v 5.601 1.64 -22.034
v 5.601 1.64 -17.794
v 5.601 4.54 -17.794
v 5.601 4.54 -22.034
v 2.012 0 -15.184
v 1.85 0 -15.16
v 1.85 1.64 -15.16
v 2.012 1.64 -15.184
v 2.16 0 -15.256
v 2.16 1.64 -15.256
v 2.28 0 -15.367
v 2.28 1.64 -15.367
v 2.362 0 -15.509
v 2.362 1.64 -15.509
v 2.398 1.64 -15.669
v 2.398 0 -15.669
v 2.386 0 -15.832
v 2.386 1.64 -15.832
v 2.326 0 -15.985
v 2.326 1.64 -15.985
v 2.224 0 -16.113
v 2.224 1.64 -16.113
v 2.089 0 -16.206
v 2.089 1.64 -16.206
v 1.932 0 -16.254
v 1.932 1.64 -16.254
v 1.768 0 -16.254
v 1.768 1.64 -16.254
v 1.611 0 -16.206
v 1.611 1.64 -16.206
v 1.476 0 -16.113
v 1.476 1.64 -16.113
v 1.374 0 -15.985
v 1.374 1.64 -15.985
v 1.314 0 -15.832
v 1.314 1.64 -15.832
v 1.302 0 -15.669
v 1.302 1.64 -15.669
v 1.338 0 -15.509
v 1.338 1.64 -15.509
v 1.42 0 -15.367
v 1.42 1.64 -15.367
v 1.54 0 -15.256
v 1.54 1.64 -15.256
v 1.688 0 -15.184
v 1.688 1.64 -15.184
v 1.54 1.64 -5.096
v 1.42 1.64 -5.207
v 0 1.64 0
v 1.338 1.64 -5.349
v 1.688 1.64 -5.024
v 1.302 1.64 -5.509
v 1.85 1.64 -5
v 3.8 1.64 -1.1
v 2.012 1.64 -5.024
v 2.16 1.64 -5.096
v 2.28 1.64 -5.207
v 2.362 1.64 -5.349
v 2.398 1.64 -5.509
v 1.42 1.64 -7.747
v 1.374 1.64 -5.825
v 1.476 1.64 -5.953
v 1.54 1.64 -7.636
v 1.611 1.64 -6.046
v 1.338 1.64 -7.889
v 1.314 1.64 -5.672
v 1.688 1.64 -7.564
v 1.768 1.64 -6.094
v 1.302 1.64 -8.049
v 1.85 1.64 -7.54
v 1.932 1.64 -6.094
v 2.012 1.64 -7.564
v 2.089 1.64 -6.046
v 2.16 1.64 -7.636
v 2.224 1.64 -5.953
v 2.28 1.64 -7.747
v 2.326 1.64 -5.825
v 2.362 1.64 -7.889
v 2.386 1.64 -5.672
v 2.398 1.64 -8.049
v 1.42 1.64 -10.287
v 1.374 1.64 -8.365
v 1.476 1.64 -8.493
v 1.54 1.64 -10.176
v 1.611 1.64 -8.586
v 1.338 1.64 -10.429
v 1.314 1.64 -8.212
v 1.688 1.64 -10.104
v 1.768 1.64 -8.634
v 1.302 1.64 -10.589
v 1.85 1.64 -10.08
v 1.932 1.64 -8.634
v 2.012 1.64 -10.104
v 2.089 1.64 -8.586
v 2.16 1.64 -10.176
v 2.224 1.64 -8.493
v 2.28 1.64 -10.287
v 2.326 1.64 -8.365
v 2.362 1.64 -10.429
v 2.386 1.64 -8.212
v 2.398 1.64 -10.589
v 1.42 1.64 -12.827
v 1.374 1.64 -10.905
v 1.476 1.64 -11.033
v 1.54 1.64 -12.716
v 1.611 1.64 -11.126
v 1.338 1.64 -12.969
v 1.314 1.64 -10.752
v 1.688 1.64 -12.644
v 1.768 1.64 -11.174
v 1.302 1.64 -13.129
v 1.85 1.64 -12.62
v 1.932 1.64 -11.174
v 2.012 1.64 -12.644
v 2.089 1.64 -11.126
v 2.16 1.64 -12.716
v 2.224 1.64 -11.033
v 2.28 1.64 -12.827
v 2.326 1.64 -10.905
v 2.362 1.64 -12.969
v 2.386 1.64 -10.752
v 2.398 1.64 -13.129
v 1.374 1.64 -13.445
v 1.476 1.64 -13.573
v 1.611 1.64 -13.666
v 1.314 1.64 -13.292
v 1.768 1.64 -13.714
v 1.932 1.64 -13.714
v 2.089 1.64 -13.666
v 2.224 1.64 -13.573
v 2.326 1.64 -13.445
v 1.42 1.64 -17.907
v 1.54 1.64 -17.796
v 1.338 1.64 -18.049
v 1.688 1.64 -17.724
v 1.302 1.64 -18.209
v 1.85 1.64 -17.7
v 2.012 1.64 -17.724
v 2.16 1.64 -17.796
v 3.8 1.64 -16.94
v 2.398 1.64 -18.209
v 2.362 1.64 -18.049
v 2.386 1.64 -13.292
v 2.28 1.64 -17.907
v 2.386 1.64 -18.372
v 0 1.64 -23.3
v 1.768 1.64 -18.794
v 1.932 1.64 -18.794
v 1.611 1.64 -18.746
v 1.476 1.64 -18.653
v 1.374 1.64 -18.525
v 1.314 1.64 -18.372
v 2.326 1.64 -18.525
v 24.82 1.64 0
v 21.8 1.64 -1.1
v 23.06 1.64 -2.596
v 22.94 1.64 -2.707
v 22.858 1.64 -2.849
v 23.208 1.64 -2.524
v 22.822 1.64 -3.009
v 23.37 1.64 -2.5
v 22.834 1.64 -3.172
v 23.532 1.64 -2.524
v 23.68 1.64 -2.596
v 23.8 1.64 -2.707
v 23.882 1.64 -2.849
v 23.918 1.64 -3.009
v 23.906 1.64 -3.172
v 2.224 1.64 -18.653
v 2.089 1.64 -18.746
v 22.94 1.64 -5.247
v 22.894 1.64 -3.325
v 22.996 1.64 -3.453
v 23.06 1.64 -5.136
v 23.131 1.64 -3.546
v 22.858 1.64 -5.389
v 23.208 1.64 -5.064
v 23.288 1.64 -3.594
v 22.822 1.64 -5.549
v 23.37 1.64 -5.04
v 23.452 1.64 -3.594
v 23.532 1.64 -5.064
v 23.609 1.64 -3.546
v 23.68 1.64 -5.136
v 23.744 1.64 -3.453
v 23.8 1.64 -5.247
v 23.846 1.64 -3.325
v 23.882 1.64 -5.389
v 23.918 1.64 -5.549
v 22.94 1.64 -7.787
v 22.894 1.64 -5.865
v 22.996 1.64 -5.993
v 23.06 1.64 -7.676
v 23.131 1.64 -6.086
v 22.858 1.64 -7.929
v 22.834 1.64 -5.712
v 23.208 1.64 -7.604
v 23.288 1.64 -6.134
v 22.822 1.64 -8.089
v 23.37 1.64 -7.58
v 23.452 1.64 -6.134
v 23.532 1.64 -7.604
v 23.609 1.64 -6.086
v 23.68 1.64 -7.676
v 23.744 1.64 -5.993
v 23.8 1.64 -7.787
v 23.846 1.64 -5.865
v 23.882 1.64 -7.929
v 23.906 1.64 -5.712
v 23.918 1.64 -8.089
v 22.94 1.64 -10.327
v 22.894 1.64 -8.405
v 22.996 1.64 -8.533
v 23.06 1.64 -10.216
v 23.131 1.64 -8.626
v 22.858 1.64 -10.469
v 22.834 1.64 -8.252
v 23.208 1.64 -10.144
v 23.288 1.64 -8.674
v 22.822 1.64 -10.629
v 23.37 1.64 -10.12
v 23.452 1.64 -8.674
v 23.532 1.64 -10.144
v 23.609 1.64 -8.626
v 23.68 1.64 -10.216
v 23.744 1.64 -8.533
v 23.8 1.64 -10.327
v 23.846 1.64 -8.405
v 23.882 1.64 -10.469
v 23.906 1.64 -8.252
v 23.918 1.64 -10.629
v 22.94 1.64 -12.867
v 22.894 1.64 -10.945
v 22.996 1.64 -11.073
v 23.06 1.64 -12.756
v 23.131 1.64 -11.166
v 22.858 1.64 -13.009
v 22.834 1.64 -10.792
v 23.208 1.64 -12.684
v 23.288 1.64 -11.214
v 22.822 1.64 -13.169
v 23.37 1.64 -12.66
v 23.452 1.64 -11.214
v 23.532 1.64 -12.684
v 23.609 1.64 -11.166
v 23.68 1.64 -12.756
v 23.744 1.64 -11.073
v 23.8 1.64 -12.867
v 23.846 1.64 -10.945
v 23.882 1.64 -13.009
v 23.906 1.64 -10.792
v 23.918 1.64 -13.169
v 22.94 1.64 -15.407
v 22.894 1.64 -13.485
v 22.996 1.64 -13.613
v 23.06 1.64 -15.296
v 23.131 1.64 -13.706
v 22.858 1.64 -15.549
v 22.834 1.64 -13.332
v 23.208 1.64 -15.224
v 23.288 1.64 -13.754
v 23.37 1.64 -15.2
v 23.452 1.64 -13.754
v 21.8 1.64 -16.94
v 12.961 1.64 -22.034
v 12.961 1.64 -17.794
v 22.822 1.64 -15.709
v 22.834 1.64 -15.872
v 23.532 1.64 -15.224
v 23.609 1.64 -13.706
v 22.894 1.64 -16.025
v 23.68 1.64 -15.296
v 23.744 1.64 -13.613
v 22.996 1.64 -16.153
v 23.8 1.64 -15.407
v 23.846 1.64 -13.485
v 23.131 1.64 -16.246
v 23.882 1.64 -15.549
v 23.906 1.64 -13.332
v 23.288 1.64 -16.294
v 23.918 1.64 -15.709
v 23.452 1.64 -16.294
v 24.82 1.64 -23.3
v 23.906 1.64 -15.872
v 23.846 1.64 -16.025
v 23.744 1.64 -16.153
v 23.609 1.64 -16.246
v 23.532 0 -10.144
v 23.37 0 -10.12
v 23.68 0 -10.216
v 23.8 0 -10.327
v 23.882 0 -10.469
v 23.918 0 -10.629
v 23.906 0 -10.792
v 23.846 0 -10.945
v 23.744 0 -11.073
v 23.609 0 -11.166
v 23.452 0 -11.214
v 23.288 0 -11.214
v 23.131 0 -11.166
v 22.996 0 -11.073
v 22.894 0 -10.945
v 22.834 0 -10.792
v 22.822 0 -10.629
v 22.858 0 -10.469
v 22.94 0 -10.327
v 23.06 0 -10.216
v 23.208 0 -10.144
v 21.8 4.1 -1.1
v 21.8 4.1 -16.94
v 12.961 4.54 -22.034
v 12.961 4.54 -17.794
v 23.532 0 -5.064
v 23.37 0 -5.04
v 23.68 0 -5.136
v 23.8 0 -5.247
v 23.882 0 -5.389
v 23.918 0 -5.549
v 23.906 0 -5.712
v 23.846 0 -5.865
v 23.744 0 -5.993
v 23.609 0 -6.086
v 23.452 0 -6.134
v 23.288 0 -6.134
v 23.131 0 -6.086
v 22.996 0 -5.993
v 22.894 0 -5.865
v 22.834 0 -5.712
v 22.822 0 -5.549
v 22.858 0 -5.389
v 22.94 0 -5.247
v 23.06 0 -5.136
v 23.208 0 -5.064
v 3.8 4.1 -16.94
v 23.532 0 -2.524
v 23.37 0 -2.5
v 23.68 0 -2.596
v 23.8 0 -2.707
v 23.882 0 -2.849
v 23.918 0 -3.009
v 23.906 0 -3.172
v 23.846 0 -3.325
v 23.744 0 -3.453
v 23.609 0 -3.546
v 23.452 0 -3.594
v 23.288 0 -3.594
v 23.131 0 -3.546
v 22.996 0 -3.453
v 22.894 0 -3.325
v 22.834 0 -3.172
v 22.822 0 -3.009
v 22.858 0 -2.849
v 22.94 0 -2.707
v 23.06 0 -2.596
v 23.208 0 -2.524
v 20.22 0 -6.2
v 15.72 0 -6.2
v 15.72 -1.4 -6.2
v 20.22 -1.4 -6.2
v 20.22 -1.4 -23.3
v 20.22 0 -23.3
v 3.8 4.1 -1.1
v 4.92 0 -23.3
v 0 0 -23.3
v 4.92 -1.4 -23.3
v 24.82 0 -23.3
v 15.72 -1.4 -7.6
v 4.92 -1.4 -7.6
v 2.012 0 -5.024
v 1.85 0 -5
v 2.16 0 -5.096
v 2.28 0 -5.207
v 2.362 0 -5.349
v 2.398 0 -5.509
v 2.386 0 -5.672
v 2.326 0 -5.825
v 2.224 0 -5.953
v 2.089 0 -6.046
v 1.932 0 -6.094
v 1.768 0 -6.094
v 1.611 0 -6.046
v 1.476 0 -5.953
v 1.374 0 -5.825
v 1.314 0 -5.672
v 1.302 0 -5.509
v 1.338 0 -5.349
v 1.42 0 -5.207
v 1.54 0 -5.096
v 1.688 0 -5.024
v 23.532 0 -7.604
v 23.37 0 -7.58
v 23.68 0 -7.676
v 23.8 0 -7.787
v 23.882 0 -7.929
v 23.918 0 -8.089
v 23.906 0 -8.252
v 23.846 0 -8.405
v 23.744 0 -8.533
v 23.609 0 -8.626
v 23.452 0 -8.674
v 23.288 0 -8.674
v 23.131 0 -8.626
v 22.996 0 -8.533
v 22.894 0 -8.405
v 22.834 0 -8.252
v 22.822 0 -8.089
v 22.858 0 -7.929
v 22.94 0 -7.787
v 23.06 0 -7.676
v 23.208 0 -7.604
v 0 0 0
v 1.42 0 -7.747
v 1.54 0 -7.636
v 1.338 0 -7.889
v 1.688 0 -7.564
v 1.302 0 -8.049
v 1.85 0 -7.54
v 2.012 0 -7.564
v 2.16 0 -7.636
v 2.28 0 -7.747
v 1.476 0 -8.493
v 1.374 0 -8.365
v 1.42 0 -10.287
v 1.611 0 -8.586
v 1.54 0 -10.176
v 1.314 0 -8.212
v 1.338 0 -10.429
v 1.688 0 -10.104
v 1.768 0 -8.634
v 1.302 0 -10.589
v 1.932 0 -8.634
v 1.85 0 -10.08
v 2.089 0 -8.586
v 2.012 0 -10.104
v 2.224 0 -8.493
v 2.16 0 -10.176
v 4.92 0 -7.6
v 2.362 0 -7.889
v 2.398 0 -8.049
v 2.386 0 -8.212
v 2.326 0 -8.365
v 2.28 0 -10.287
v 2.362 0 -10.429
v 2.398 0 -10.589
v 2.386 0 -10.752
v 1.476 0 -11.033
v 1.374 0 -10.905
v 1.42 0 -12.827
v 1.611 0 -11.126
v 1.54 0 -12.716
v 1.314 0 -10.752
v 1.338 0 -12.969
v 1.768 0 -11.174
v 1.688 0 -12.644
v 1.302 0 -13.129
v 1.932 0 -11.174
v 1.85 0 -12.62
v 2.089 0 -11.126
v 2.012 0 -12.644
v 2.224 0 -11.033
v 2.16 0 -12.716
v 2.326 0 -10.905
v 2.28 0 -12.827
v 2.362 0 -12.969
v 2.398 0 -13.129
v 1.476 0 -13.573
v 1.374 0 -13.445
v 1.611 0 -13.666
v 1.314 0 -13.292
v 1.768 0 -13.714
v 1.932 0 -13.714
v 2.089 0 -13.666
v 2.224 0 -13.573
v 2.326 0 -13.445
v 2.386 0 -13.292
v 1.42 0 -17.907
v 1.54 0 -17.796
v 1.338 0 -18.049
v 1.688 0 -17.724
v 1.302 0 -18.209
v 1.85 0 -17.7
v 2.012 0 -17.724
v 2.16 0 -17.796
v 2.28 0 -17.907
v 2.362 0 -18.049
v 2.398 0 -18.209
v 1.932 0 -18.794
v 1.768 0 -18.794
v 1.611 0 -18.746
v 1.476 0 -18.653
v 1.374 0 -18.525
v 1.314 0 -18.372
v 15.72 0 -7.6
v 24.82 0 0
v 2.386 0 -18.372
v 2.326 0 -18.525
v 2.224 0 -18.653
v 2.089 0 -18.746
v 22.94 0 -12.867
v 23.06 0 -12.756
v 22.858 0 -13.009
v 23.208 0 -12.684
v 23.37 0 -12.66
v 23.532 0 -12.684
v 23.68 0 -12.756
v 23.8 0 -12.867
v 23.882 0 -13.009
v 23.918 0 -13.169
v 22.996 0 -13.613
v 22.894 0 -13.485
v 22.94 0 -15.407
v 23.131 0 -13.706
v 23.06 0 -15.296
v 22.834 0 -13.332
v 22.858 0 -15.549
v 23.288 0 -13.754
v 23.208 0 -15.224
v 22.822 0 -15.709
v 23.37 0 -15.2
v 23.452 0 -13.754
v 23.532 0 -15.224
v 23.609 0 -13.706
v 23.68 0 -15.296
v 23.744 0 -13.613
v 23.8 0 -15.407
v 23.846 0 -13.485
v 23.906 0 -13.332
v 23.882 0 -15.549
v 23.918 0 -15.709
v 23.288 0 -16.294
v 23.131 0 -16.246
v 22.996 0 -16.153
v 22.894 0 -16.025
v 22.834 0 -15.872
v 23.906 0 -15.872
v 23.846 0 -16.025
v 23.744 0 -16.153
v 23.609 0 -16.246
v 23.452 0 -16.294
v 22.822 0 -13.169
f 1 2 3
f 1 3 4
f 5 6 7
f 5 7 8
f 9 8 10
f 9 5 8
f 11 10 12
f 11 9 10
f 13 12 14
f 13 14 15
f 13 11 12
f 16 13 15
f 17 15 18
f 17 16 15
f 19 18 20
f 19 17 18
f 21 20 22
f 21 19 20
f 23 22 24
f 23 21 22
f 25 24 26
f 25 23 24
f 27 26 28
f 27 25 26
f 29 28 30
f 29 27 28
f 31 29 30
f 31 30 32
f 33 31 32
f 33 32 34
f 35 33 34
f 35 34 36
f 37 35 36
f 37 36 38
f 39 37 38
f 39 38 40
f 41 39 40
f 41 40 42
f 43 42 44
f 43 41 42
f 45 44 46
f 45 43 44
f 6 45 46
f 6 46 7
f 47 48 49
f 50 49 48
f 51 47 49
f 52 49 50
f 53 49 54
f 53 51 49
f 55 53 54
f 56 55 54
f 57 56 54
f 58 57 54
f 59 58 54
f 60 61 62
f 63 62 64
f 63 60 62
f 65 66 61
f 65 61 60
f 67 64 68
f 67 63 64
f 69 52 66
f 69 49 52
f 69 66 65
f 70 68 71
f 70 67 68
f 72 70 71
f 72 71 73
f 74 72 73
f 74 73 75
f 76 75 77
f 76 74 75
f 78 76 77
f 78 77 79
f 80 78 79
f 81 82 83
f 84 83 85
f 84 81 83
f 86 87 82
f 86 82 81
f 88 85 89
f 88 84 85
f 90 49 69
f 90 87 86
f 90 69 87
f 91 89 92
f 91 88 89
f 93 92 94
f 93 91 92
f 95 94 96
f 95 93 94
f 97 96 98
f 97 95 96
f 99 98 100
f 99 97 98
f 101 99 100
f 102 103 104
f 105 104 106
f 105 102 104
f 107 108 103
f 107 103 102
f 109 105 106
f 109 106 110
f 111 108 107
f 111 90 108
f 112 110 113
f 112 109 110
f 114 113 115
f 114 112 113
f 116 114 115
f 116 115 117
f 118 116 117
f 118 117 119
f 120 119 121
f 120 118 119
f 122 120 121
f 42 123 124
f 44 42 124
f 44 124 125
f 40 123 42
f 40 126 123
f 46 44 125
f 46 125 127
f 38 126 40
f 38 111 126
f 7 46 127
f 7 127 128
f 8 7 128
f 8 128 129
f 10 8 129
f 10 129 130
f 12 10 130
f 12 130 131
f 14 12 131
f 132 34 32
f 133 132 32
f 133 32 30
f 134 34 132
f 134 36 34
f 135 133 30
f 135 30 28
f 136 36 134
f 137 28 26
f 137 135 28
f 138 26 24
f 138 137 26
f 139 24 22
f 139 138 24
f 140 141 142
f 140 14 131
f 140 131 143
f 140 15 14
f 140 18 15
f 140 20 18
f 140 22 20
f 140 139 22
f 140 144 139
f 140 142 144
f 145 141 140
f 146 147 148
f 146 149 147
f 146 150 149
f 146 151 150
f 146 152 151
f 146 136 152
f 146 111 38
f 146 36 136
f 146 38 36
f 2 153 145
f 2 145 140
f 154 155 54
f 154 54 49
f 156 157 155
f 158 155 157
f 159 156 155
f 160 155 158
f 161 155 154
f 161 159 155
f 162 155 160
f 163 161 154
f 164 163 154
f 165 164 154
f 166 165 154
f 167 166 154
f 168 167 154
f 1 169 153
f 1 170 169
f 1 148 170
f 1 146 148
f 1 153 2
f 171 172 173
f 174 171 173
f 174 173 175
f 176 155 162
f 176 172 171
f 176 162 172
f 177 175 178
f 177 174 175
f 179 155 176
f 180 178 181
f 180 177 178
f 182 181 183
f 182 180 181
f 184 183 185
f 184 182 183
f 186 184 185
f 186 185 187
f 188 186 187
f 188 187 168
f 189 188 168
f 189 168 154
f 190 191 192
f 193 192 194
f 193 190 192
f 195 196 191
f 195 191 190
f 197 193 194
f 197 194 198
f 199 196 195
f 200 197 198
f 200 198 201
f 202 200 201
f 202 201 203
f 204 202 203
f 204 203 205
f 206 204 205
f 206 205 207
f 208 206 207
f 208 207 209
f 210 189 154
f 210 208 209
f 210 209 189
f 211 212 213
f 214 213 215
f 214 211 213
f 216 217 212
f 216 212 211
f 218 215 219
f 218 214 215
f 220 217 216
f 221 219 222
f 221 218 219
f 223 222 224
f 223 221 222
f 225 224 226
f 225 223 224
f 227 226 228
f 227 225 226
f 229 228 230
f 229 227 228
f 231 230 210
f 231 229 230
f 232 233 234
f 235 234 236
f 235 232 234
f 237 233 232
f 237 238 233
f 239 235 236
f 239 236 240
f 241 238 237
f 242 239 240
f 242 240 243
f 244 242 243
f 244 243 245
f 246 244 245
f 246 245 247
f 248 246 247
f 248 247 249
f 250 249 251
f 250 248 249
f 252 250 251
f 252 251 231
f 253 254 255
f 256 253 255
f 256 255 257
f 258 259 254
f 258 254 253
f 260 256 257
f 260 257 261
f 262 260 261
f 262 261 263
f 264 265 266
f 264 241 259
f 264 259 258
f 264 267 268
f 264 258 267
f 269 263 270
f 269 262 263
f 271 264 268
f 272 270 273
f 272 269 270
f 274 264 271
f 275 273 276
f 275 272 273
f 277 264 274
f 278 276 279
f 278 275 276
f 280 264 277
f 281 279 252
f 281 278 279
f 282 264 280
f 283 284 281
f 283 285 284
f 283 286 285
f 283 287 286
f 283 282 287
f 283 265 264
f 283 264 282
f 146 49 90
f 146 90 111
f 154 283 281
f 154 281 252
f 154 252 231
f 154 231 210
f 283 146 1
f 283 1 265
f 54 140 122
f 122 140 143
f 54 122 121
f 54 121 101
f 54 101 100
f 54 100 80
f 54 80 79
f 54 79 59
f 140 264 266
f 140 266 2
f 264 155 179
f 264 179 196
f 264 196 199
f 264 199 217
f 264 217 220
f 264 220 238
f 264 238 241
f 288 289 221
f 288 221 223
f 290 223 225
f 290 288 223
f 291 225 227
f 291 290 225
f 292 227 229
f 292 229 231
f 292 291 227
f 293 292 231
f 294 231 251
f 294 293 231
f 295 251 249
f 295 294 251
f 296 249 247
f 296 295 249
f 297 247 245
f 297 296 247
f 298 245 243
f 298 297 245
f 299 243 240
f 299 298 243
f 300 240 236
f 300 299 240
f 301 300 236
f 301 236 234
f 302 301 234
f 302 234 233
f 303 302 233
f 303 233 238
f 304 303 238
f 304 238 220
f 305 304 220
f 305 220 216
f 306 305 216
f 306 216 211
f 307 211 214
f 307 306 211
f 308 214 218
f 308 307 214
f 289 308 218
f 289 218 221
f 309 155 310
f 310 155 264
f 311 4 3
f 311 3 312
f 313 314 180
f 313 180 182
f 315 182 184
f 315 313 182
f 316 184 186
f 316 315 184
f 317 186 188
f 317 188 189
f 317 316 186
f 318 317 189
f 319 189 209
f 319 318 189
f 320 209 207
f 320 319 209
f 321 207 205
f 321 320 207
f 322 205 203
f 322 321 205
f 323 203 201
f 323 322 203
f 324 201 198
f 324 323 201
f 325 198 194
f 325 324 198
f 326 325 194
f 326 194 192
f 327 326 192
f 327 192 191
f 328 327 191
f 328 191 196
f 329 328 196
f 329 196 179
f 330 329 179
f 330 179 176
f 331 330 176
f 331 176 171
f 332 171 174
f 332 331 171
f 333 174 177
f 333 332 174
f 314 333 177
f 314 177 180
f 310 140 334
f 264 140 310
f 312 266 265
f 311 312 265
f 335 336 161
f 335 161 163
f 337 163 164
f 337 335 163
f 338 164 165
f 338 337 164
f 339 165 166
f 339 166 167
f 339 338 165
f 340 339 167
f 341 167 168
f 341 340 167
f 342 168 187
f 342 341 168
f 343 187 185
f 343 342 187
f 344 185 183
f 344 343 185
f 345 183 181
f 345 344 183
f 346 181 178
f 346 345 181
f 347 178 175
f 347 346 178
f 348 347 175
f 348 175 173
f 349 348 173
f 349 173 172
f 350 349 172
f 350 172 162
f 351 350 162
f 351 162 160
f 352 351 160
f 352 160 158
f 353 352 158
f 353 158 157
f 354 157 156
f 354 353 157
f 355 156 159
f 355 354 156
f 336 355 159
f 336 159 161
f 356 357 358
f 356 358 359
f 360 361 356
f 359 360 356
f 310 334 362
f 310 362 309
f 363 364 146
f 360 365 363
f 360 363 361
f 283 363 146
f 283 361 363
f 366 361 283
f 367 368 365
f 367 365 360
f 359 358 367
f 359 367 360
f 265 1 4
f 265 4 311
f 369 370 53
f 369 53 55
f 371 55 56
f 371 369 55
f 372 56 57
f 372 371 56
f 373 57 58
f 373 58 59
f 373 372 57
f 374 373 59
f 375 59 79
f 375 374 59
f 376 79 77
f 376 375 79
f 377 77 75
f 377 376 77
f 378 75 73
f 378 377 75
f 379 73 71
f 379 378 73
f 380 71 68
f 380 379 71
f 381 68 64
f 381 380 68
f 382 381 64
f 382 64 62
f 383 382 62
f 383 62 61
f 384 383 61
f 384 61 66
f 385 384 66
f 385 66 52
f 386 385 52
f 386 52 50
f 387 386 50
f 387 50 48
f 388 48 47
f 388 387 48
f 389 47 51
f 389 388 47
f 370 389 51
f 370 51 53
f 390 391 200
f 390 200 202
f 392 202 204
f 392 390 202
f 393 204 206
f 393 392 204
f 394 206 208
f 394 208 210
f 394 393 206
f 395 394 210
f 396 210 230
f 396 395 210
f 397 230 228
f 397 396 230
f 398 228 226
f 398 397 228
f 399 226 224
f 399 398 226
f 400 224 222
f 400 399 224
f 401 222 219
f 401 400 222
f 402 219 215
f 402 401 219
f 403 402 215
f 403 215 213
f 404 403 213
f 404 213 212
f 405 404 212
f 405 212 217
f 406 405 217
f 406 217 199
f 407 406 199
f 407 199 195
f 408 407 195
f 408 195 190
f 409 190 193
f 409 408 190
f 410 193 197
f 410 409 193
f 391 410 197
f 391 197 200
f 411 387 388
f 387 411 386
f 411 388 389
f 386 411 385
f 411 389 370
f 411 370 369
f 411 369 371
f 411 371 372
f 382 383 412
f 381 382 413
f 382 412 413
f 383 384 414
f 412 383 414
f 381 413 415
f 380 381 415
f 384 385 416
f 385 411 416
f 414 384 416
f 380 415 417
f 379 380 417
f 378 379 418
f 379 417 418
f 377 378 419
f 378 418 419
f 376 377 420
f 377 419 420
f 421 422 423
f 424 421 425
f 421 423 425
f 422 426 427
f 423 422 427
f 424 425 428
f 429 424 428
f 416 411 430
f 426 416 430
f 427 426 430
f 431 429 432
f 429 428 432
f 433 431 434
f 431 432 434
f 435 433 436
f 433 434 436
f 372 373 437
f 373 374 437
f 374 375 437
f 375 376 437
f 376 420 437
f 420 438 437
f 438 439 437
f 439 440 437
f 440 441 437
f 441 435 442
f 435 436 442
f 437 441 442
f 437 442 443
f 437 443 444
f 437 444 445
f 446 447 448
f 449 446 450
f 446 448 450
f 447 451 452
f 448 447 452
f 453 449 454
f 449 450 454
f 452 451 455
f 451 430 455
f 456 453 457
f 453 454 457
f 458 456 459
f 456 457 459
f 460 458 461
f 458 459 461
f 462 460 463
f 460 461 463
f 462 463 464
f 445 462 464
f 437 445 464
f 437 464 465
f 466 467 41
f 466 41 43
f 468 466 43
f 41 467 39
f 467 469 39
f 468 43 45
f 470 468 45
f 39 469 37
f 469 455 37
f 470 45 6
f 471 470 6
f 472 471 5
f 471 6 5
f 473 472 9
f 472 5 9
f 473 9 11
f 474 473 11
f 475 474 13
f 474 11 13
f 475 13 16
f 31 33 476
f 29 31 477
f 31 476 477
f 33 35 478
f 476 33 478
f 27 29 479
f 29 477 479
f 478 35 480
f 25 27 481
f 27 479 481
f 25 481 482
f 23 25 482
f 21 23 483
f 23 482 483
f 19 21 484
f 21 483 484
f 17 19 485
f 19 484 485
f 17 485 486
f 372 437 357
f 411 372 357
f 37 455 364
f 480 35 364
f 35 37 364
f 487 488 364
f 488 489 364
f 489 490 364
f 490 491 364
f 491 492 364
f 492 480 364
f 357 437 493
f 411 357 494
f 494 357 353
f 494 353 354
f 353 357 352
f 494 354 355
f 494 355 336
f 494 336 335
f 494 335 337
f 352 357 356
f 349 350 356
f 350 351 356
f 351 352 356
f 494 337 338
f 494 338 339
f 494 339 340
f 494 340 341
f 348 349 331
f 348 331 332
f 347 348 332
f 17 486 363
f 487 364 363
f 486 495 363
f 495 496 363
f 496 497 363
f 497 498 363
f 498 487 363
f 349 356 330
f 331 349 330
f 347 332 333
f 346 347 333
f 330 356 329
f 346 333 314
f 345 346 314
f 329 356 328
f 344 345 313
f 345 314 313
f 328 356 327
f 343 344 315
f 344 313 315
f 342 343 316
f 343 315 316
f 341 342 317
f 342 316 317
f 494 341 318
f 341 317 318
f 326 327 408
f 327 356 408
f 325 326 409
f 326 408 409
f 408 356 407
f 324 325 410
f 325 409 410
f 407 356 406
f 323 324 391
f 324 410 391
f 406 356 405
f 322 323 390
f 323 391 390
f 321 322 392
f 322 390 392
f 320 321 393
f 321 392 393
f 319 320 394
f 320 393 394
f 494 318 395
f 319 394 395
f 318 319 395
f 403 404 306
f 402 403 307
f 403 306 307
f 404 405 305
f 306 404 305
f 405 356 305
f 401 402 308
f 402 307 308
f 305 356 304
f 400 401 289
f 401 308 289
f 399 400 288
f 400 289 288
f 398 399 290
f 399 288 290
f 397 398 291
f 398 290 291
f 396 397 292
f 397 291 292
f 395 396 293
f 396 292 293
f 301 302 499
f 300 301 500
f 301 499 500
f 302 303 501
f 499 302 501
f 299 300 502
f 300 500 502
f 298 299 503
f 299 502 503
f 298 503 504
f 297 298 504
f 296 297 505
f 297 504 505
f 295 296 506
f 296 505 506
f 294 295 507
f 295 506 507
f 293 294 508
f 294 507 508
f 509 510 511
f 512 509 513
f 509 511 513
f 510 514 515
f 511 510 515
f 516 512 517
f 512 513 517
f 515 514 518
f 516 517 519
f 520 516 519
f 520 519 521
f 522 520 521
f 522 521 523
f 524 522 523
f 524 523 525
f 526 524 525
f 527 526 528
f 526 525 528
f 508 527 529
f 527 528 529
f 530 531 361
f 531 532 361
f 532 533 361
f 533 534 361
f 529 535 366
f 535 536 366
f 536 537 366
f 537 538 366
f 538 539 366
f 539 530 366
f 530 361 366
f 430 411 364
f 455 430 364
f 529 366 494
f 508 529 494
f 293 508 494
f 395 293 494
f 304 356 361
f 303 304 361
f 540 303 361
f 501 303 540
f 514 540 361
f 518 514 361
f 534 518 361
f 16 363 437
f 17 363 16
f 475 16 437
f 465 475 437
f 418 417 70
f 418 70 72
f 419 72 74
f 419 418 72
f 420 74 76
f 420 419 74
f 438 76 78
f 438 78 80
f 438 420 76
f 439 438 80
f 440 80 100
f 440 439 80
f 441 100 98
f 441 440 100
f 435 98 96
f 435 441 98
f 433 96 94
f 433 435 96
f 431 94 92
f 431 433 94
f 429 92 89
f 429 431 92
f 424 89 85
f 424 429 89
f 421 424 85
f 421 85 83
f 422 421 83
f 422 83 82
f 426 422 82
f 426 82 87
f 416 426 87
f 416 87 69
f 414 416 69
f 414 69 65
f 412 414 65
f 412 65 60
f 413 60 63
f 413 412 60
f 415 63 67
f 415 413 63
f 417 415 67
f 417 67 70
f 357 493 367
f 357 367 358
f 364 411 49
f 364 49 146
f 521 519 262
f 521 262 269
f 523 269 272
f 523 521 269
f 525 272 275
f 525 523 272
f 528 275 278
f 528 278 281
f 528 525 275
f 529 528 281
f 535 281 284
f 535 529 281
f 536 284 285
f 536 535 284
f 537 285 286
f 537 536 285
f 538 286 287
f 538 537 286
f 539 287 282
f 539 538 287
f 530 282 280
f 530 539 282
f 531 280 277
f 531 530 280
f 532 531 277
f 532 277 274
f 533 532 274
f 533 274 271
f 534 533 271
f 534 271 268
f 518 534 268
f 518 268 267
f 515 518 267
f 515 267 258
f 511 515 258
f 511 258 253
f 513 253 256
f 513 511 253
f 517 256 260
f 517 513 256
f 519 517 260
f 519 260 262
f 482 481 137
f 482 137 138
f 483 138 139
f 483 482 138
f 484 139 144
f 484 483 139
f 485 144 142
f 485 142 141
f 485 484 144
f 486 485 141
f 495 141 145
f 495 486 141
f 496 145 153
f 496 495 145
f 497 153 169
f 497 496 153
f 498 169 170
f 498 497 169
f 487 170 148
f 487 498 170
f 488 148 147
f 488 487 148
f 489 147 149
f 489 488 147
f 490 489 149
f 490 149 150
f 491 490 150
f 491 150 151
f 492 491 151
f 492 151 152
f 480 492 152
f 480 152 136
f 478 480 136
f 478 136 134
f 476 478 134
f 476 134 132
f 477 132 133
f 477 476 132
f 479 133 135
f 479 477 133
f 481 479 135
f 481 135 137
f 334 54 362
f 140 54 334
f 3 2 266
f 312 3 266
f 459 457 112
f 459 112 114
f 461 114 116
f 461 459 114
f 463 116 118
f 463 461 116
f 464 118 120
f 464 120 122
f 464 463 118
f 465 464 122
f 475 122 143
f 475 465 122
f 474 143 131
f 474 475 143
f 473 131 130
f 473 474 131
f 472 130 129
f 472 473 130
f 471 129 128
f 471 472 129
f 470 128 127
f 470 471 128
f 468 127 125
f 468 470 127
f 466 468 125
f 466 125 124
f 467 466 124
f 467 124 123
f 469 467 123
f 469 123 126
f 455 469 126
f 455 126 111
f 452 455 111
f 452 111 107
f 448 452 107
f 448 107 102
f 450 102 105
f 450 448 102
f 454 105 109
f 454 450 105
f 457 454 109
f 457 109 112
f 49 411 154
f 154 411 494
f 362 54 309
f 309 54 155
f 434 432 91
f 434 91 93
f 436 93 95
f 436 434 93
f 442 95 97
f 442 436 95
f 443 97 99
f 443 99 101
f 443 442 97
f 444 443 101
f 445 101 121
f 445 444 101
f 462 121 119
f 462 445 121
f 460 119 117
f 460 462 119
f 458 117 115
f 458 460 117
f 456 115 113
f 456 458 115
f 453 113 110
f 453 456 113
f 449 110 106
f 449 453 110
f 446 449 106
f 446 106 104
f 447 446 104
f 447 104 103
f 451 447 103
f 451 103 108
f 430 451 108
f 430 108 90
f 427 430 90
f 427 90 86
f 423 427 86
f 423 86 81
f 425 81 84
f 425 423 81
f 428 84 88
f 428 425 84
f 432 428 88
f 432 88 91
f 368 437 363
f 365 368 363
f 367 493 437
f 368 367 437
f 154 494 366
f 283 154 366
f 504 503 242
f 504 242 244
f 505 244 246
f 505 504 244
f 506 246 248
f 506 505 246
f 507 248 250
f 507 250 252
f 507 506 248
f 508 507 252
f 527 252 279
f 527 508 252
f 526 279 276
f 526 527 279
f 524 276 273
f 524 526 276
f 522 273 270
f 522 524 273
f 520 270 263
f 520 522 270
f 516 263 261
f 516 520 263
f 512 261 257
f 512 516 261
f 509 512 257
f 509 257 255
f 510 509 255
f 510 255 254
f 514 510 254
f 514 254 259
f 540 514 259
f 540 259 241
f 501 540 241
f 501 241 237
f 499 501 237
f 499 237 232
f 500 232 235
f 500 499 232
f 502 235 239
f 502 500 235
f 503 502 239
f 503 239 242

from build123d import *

# Parameters (mm, degrees)
ESQUISSE1_W        = 24.82
ESQUISSE1_H        = 23.3
ESQUISSE1_R        = 0.55
BOSS_EXTRU_1_DEPTH = 1.64
ESQUISSE2_W        = 18
ESQUISSE2_H        = 15.84
BOSS_EXTRU_2_DEPTH = 2.46
ESQUISSE3_W        = 7.36
ESQUISSE3_H        = 4.24
BOSS_EXTRU_3_DEPTH = 2.9
ESQUISSE4_W        = 4.5
ESQUISSE4_H        = 1.4
BOSS_EXTRU_4_DEPTH = 1.4


with BuildPart() as part:
    # Esquisse1 → Boss.-Extru.1 (new body)
    with BuildSketch(Plane(origin=(0, 0, 0), x_dir=(1, 0, 0), z_dir=(0, 1, 0))):
        with Locations((12.41, 11.65)):
            Rectangle(ESQUISSE1_W, ESQUISSE1_H)
        with Locations(Location((1.85, 5.55, 0), (0, 0, 270))):
            Circle(ESQUISSE1_R, mode=Mode.SUBTRACT)
        with Locations(Location((23.37, 3.05, 0), (0, 0, 270))):
            Circle(ESQUISSE1_R, mode=Mode.SUBTRACT)
        with Locations(Location((1.85, 8.09, 0), (0, 0, 270))):
            Circle(ESQUISSE1_R, mode=Mode.SUBTRACT)
        with Locations(Location((23.37, 5.59, 0), (0, 0, 270))):
            Circle(ESQUISSE1_R, mode=Mode.SUBTRACT)
        with Locations(Location((1.85, 10.63, 0), (0, 0, 270))):
            Circle(ESQUISSE1_R, mode=Mode.SUBTRACT)
        with Locations(Location((23.37, 8.13, 0), (0, 0, 270))):
            Circle(ESQUISSE1_R, mode=Mode.SUBTRACT)
        with Locations(Location((1.85, 13.17, 0), (0, 0, 270))):
            Circle(ESQUISSE1_R, mode=Mode.SUBTRACT)
        with Locations(Location((23.37, 10.67, 0), (0, 0, 270))):
            Circle(ESQUISSE1_R, mode=Mode.SUBTRACT)
        with Locations(Location((1.85, 15.71, 0), (0, 0, 270))):
            Circle(ESQUISSE1_R, mode=Mode.SUBTRACT)
        with Locations(Location((23.37, 13.21, 0), (0, 0, 270))):
            Circle(ESQUISSE1_R, mode=Mode.SUBTRACT)
        with Locations(Location((1.85, 18.25, 0), (0, 0, 270))):
            Circle(ESQUISSE1_R, mode=Mode.SUBTRACT)
        with Locations(Location((23.37, 15.75, 0), (0, 0, 270))):
            Circle(ESQUISSE1_R, mode=Mode.SUBTRACT)
    extrude(amount=BOSS_EXTRU_1_DEPTH)

    # Esquisse2 → Boss.-Extru.2 (add)
    with BuildSketch(Plane(origin=(0, 1.64, 0), x_dir=(1, 0, 0), z_dir=(0, 1, 0))):
        with Locations((12.8, 9.02)):
            Rectangle(ESQUISSE2_W, ESQUISSE2_H)
    extrude(amount=BOSS_EXTRU_2_DEPTH)

    # Esquisse3 → Boss.-Extru.3 (add)
    with BuildSketch(Plane(origin=(0, 1.64, 0), x_dir=(1, 0, 0), z_dir=(0, 1, 0))):
        with Locations((9.281405269, 19.914341586)):
            Rectangle(ESQUISSE3_W, ESQUISSE3_H)
    extrude(amount=BOSS_EXTRU_3_DEPTH)

    # Esquisse4 → Boss.-Extru.4 (add)
    with BuildSketch(Plane.XZ):
        Polygon((15.72, -7.6), (4.92, -7.6), (4.92, -23.3), (20.22, -23.3), (20.22, -7.6), align=None)
        with Locations((17.97, -6.9)):
            Rectangle(ESQUISSE4_W, ESQUISSE4_H)
    extrude(amount=BOSS_EXTRU_4_DEPTH)


solid = part.part
